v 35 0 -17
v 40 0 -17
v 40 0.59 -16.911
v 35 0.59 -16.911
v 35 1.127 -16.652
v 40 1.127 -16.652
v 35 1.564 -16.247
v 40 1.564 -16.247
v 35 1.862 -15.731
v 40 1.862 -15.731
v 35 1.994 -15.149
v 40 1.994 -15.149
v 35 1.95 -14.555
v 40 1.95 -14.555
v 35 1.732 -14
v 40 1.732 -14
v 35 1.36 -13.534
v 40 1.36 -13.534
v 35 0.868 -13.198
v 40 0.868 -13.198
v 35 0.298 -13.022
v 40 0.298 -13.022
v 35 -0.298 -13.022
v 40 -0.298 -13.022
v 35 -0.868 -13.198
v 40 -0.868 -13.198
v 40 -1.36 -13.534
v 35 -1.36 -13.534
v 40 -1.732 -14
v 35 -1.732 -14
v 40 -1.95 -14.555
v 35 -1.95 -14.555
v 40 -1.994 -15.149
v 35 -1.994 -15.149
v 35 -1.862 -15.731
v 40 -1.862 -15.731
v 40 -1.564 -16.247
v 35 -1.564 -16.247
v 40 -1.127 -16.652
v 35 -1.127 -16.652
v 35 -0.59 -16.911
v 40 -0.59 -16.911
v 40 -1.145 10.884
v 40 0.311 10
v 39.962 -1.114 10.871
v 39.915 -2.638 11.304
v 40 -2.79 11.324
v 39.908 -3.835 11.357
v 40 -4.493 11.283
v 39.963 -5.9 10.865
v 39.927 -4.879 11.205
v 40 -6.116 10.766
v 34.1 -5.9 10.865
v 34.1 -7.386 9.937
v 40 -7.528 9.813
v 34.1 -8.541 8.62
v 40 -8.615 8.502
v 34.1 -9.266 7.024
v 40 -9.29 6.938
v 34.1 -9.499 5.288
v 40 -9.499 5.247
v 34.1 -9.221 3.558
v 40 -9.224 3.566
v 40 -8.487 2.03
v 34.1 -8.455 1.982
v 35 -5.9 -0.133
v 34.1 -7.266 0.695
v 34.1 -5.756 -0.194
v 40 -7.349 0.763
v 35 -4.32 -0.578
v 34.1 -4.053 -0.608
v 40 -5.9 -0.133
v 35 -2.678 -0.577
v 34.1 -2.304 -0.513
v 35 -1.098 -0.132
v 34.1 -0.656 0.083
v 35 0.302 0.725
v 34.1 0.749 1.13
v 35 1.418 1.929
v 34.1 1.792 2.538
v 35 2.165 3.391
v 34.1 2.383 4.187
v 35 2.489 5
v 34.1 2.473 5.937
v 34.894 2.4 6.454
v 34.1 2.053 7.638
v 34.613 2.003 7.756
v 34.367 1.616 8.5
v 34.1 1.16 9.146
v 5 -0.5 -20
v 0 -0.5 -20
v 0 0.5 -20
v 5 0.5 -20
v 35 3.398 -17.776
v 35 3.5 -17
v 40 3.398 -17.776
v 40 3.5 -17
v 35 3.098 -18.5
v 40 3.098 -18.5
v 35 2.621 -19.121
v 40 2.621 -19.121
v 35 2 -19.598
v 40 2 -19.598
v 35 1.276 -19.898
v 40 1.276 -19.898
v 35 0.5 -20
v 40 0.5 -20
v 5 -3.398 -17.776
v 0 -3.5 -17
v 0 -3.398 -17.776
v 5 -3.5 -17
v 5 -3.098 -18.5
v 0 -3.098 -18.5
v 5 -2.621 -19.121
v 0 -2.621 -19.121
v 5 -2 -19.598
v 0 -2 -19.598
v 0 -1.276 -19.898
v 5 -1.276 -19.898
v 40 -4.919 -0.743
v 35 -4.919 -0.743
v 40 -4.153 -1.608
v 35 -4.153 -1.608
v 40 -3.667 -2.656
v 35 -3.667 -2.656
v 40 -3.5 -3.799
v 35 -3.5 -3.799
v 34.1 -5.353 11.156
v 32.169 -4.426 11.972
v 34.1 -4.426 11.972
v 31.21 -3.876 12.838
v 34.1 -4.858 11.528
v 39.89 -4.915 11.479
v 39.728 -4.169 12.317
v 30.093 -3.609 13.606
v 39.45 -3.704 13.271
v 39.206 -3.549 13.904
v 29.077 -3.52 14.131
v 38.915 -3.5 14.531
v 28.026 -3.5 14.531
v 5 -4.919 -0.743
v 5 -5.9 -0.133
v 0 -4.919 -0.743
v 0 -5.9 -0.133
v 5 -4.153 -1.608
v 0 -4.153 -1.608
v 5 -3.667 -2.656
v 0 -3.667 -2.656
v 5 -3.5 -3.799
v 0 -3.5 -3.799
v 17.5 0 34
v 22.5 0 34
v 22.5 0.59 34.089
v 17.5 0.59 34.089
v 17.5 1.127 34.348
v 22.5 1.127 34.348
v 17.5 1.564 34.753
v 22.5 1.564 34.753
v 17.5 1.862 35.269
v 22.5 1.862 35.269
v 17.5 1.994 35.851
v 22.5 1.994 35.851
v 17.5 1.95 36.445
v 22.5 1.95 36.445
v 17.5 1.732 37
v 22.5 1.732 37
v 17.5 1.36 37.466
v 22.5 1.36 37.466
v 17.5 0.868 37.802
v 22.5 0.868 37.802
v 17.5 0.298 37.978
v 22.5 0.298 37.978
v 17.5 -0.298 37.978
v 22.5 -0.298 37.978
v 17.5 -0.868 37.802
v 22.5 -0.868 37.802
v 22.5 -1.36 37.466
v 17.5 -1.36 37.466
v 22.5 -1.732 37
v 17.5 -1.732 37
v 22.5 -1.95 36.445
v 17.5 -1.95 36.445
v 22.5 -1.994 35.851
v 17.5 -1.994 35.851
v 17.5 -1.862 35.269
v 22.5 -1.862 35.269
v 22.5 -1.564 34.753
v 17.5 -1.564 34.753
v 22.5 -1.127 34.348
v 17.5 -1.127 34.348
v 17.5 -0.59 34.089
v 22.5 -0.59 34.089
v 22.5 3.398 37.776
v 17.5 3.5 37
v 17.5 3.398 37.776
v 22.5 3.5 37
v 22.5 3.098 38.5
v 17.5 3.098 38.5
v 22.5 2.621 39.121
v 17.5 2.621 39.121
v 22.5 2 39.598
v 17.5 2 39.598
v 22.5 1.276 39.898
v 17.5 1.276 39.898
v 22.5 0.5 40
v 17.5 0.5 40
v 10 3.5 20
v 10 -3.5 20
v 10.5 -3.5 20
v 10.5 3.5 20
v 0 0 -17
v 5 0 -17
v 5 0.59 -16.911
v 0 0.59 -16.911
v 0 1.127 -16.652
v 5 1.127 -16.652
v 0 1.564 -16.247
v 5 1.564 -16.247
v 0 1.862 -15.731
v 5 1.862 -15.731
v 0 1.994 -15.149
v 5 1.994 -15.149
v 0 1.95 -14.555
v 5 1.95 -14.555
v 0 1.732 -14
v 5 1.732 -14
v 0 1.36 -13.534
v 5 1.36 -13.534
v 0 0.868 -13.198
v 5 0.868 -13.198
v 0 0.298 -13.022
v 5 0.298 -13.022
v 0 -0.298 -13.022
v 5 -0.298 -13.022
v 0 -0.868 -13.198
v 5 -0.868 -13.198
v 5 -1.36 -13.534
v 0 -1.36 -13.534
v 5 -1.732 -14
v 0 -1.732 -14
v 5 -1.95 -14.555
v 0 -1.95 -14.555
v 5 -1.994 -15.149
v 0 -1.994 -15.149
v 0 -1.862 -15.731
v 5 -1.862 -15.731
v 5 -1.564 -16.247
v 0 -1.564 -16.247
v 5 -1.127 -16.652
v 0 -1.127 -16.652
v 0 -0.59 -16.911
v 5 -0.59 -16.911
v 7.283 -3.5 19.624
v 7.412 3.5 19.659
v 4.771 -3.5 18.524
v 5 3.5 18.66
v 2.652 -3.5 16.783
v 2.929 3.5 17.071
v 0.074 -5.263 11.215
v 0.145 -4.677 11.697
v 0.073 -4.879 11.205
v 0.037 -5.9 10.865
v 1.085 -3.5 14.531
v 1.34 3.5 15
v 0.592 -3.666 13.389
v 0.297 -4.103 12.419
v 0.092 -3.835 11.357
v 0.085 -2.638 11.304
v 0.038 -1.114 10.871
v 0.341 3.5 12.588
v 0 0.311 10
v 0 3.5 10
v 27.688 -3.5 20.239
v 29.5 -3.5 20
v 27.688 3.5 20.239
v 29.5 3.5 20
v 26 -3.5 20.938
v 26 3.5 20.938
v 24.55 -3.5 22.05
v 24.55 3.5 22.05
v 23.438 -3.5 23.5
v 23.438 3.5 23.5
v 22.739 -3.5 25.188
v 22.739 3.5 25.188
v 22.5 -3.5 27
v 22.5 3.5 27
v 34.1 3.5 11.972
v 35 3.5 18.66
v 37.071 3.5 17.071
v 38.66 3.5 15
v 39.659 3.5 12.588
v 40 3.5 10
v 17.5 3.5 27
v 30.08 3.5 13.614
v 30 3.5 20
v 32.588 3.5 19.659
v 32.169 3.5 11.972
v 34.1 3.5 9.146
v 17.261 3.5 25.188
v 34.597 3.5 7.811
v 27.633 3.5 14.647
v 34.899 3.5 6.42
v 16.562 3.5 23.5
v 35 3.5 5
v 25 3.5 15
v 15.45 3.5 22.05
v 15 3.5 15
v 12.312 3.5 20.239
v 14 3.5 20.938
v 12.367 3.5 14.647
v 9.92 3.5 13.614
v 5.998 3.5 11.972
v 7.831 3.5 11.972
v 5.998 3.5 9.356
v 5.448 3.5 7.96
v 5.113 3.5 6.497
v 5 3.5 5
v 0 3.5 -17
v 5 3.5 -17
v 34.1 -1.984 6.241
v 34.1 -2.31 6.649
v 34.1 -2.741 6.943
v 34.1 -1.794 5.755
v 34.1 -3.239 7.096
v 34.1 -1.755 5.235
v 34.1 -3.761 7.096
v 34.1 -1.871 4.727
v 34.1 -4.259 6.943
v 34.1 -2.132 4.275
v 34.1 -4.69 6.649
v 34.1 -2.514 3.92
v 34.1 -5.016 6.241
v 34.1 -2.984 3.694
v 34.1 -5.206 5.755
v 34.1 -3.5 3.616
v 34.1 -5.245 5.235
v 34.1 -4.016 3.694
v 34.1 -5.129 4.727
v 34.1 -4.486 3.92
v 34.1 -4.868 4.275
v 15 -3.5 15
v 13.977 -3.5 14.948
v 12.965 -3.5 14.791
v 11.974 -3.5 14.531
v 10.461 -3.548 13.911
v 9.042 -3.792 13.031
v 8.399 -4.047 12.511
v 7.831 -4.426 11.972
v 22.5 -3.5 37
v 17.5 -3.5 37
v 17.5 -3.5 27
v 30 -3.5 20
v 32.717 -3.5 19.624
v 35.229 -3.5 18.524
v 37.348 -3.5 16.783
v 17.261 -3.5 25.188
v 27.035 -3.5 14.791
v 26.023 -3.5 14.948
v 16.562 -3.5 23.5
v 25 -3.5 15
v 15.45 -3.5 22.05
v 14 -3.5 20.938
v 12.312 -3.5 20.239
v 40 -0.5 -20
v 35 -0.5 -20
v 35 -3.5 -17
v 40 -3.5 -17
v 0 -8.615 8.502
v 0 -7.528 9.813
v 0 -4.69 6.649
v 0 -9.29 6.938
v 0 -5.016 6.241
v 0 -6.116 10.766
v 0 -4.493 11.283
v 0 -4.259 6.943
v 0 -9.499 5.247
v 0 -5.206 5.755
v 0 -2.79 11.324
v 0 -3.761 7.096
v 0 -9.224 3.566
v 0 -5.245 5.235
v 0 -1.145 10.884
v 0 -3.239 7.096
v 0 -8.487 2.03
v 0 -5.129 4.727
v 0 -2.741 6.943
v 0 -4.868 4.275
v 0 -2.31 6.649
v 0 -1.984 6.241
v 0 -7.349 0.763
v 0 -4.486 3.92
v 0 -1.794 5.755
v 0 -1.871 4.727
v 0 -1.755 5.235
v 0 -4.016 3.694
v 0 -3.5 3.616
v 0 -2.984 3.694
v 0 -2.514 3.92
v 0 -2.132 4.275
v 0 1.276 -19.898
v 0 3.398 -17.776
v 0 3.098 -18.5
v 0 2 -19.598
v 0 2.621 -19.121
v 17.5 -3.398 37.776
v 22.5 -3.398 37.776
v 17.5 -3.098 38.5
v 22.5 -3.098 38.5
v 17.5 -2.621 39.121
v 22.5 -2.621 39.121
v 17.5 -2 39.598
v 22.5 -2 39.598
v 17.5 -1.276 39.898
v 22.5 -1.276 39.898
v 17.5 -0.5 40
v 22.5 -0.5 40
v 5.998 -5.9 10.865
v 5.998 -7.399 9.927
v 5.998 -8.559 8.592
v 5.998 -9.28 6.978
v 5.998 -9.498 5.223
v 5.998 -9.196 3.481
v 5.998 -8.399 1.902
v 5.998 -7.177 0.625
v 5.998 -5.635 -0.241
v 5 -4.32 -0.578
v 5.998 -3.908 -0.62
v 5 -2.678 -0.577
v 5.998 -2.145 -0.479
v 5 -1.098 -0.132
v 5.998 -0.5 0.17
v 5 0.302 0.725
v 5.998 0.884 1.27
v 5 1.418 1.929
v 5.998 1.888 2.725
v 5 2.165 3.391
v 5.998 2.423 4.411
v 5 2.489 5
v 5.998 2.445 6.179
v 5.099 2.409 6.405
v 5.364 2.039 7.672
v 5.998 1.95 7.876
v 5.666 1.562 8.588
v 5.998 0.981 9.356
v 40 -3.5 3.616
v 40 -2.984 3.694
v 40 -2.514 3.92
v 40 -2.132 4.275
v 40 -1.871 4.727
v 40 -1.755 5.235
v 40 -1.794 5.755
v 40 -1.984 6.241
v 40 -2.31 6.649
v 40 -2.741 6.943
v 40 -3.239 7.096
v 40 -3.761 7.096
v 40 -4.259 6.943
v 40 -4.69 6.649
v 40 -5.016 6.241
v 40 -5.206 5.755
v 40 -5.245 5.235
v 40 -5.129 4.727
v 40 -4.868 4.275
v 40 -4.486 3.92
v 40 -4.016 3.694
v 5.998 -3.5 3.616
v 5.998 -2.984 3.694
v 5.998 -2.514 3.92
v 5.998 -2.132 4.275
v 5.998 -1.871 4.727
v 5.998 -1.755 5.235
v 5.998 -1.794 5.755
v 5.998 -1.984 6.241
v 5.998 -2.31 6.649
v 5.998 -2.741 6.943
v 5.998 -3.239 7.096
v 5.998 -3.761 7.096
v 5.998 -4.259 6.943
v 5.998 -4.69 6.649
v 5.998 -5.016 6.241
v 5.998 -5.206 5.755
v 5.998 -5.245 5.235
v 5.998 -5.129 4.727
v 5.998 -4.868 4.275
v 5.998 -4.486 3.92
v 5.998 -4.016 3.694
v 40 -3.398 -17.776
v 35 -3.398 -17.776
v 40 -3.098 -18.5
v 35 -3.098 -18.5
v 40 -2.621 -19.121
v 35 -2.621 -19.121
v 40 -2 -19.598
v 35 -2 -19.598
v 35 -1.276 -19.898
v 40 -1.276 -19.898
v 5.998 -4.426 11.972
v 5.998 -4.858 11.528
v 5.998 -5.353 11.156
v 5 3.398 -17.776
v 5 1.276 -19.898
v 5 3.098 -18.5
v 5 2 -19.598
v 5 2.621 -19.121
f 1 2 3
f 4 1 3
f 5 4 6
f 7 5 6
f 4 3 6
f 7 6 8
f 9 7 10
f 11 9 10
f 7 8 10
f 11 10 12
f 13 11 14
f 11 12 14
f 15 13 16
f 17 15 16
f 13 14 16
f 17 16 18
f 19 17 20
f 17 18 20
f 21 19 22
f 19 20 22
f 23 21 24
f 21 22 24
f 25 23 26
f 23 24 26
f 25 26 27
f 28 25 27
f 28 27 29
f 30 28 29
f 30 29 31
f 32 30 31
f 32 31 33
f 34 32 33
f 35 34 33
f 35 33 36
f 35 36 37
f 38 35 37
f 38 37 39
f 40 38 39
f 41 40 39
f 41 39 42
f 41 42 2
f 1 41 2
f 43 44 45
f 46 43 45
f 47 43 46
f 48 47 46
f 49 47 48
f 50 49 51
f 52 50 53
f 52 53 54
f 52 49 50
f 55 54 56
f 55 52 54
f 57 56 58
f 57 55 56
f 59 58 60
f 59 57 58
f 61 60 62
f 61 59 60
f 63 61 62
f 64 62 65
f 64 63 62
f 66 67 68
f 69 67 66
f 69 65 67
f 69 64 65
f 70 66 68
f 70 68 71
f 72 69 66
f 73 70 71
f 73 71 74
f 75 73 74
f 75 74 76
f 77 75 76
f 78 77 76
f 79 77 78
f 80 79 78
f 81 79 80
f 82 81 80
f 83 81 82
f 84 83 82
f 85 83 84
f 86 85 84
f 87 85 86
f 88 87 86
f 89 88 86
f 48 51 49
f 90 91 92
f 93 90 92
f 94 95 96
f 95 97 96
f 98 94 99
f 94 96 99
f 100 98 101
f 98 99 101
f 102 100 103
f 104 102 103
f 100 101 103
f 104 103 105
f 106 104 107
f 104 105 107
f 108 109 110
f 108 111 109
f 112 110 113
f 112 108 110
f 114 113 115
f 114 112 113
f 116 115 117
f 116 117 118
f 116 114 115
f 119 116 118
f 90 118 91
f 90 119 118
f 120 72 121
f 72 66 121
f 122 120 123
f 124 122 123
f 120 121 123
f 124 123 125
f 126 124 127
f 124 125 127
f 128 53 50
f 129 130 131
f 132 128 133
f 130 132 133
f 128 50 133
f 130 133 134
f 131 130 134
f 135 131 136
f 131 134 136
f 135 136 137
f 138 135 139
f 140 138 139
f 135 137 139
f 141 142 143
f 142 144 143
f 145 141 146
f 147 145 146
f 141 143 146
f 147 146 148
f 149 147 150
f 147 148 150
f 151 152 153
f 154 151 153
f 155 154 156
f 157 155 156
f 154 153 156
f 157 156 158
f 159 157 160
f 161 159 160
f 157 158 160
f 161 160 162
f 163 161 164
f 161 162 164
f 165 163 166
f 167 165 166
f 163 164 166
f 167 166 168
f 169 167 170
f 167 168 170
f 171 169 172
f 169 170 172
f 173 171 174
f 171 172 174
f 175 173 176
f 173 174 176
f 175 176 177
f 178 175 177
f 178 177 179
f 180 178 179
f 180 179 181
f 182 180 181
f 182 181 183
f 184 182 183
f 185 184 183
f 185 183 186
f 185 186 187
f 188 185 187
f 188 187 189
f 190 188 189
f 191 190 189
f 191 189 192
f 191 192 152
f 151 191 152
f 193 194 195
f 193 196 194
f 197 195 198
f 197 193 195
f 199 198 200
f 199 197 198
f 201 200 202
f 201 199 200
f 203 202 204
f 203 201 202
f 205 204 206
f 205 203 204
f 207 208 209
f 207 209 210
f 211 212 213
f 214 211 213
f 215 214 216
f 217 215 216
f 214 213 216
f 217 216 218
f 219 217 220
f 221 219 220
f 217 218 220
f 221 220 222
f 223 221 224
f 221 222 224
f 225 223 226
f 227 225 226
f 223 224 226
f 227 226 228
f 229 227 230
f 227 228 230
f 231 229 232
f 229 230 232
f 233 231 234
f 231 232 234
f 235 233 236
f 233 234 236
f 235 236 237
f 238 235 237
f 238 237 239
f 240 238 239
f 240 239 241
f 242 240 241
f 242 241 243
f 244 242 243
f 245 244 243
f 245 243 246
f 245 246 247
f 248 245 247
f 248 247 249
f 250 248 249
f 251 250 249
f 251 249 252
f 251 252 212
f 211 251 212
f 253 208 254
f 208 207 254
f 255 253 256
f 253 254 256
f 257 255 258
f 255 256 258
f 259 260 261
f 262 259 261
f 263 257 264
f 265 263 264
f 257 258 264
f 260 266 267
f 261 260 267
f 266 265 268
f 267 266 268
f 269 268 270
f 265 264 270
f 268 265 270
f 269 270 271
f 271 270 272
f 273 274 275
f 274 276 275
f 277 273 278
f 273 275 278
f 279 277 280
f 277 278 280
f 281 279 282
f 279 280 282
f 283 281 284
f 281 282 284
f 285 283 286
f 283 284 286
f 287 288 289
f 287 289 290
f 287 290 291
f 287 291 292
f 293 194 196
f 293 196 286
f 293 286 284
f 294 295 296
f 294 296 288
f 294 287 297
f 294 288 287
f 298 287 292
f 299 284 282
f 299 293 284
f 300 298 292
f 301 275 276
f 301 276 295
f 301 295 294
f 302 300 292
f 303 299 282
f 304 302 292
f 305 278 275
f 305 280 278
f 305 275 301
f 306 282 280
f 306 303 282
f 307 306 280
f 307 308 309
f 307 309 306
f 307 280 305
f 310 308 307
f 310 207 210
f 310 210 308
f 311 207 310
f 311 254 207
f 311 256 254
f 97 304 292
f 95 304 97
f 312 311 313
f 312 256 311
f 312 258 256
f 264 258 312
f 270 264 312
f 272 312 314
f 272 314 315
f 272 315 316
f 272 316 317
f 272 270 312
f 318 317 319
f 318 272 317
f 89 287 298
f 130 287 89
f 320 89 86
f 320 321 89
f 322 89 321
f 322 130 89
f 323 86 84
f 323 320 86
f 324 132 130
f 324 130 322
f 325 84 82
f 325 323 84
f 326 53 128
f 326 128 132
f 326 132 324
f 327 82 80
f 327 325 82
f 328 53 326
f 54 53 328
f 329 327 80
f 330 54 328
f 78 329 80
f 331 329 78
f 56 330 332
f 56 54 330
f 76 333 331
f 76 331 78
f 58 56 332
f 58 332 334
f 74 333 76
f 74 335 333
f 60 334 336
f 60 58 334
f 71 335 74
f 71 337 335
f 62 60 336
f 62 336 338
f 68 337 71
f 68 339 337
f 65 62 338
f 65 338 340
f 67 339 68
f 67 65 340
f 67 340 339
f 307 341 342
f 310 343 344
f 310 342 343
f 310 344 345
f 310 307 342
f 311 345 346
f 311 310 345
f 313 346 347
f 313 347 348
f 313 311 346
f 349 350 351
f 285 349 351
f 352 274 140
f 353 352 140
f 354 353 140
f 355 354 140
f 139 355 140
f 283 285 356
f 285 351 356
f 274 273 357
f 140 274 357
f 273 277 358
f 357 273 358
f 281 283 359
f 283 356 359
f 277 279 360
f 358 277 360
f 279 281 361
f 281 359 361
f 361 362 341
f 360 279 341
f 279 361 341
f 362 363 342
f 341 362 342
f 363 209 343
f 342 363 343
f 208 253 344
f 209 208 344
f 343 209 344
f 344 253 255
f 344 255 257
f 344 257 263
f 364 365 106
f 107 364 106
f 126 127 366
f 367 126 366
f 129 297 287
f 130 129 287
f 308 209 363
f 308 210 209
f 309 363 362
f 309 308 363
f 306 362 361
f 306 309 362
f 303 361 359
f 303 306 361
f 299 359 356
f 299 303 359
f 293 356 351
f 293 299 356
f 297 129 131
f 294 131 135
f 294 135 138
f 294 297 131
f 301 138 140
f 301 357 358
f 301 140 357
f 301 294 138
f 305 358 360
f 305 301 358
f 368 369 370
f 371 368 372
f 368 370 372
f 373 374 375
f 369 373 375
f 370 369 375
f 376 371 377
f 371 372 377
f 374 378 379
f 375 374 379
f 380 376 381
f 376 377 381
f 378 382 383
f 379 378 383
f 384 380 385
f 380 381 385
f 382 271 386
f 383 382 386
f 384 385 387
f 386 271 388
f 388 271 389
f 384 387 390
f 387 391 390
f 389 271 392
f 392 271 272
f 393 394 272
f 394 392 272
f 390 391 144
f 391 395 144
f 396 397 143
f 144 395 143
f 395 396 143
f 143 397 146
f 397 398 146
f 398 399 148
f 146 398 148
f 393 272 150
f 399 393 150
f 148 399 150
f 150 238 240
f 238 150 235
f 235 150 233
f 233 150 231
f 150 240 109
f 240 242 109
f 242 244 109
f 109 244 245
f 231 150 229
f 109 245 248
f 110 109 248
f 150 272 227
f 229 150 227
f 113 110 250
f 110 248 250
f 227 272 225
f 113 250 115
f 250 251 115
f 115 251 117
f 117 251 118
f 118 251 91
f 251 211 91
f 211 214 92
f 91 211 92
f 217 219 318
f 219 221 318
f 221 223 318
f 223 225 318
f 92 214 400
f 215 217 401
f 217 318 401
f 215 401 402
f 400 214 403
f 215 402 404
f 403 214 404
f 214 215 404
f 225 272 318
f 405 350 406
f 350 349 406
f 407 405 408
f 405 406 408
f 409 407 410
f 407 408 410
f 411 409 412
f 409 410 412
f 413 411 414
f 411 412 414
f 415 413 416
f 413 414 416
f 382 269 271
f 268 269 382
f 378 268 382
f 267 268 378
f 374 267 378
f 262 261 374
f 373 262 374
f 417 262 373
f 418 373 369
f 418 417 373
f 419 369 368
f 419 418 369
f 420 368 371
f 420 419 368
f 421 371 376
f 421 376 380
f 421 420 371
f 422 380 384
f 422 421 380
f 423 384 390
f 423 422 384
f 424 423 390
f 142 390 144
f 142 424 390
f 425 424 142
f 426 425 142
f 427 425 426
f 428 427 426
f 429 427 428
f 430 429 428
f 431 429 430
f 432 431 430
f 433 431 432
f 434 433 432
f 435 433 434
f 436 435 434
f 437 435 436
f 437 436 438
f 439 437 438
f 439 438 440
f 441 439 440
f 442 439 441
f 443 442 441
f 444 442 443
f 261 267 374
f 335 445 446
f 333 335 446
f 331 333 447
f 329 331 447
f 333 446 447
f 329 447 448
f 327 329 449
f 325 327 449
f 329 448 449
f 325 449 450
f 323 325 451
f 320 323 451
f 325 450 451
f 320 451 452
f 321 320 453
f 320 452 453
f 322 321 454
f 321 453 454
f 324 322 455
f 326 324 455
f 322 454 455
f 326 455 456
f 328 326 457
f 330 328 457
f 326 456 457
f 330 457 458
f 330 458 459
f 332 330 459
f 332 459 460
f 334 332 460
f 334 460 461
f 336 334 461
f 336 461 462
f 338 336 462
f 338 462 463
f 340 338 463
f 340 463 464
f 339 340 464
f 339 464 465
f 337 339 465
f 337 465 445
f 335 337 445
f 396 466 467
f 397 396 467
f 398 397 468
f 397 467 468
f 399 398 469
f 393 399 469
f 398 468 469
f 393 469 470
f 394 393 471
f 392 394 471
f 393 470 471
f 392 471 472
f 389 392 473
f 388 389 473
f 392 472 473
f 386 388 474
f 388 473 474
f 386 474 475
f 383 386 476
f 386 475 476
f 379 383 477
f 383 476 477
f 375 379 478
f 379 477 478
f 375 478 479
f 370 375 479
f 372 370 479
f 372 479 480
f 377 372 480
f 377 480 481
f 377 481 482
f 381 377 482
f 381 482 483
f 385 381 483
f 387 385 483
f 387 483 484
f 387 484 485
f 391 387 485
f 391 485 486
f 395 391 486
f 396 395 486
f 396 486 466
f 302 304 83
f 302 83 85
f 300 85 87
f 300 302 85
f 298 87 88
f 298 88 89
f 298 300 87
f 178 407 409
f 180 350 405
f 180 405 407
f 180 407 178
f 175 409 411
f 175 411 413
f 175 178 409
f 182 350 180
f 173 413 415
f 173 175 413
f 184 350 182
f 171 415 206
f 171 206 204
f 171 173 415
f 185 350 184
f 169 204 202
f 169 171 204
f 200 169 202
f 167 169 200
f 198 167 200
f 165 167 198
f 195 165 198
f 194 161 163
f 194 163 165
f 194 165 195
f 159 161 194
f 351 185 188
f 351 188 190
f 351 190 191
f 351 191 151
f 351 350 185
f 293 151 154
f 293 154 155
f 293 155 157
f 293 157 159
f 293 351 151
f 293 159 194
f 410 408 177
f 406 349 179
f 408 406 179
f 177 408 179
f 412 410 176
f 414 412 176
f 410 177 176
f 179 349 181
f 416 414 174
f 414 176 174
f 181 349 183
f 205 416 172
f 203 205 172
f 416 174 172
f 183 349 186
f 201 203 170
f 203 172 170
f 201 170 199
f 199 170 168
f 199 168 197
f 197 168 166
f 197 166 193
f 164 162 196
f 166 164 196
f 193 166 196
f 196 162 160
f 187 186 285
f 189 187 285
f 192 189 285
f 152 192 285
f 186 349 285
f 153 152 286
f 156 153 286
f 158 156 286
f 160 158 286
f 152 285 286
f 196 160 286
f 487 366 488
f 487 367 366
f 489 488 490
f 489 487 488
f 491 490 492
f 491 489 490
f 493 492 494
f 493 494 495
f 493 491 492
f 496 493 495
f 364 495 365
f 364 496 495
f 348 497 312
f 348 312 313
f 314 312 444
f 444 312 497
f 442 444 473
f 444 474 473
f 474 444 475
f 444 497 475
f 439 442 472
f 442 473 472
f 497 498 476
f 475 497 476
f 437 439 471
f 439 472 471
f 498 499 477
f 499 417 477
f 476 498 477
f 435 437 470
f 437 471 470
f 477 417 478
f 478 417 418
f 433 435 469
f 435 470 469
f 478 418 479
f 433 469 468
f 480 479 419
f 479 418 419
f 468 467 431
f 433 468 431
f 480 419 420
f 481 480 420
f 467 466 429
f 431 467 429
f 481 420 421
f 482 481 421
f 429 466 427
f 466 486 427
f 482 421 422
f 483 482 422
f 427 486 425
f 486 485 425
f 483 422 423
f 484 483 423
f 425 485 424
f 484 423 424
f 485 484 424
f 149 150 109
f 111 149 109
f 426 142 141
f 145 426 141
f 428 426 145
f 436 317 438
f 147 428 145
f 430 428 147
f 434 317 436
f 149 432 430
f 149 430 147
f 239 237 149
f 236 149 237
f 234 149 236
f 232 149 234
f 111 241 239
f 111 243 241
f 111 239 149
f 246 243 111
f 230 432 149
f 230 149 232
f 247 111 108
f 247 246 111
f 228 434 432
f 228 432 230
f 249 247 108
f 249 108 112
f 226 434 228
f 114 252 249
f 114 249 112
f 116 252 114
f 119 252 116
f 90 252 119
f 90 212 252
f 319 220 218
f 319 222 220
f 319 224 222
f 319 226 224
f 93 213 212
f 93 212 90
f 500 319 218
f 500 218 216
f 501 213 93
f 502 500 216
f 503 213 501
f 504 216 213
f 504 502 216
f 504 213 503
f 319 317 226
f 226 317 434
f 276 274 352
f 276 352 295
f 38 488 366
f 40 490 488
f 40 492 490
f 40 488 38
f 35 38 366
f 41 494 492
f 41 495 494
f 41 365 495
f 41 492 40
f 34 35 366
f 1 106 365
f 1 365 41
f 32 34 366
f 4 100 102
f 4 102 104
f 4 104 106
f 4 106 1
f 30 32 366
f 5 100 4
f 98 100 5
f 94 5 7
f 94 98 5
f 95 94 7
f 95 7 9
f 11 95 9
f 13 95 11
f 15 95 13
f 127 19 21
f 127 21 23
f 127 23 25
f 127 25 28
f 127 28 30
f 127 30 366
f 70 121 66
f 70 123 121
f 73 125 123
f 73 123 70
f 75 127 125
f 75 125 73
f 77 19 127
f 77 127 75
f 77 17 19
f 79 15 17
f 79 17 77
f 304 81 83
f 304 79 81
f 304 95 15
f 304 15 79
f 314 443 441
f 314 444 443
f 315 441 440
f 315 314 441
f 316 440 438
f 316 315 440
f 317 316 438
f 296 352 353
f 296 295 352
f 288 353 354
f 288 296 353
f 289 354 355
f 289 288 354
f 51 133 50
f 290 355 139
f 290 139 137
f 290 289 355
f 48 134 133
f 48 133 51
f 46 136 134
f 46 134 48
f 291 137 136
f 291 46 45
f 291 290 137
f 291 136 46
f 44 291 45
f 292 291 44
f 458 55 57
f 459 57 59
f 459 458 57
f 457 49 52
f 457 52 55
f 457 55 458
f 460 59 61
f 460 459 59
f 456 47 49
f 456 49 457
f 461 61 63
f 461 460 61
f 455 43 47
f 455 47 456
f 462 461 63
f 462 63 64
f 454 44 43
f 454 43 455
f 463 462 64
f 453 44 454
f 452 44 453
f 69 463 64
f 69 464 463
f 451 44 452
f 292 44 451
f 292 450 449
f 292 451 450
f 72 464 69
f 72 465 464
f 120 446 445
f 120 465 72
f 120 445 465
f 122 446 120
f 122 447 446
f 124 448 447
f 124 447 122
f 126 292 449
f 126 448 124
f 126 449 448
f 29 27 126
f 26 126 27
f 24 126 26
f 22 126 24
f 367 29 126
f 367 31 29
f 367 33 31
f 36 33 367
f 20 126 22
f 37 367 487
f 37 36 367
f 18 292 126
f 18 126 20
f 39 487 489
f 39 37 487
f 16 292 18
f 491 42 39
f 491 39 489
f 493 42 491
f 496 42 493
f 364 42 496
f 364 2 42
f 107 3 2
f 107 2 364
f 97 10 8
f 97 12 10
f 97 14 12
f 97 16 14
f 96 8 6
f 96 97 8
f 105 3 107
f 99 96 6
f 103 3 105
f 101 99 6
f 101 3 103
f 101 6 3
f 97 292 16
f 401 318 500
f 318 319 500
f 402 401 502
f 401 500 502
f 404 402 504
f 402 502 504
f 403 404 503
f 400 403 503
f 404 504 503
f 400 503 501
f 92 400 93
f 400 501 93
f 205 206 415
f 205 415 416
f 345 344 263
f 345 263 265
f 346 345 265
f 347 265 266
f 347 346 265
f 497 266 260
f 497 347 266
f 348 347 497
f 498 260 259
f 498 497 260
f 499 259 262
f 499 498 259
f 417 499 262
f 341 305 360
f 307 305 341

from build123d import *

# Parameters (mm, degrees)
SKETCH1_W               = 40
SKETCH1_H               = 7
BOSS_EXTRUDE1_DEPTH     = 40
CUT_EXTRUDE1_DEPTH      = 8
FILLET1_R               = 10
SKETCH5_W               = 5
SKETCH5_H               = 7
BOSS_EXTRUDE2_DEPTH     = 20
FILLET2_R               = 7
FILLET3_R               = 3
SKETCH6_R               = 2
CUT_EXTRUDE2_DEPTH      = 41
SKETCH7_R               = 2
CUT_EXTRUDE3_DEPTH      = 23.5
SKETCH8_R               = 6
BOSS_EXTRUDE3_DEPTH     = 40
SKETCH9_W               = 28.10166571
SKETCH9_H               = 14.198736358
CUT_EXTRUDE4_DEPTH      = 4.5000001
CUT_EXTRUDE4_DEPTH_BACK = 10.5000001
SKETCH10_R              = 1.75
CUT_EXTRUDE5_DEPTH      = 41.0000001
FILLET4_R               = 4


with BuildPart() as part:
    # Sketch1 → Boss-Extrude1 (new body)
    with BuildSketch(Plane(origin=(0, 0, 0), x_dir=(0, 0, -1), z_dir=(1, 0, 0))):
        Rectangle(SKETCH1_W, SKETCH1_H)
    extrude(amount=BOSS_EXTRUDE1_DEPTH)

    # Sketch2 → Cut-Extrude1 (cut, through all)
    with BuildSketch(Plane(origin=(0, 3.5, 0), x_dir=(1, 0, 0), z_dir=(0, 1, 0))):
        with BuildLine():
            Line((5, 20), (35, 20))
            Line((35, 20), (35, -5))
            ThreePointArc((35, -5), (32.071067812, -12.071067812), (25, -15))
            Line((25, -15), (15, -15))
            ThreePointArc((15, -15), (7.928932188, -12.071067812), (5, -5))
            Line((5, -5), (5, 20))
        make_face()
    extrude(amount=-CUT_EXTRUDE1_DEPTH, mode=Mode.SUBTRACT)

    # Fillet1
    fillet1_edges = [part.edges().sort_by_distance(p)[0] for p in [
        (40, 0, 20),
        (0, 0, 20),
    ]]
    fillet(fillet1_edges, radius=FILLET1_R)

    # Sketch5 → Boss-Extrude2 (add)
    with BuildSketch(Plane.XY.offset(20)):
        with Locations((20, 0)):
            Rectangle(SKETCH5_W, SKETCH5_H)
    extrude(amount=BOSS_EXTRUDE2_DEPTH)

    # Fillet2
    fillet2_edges = [part.edges().sort_by_distance(p)[0] for p in [
        (17.5, 0, 20),
        (22.5, 0, 20),
    ]]
    fillet(fillet2_edges, radius=FILLET2_R)

    # Fillet3
    fillet3_edges = [part.edges().sort_by_distance(p)[0] for p in [
        (2.5, -3.5, -20),
        (2.5, 3.5, -20),
        (20, -3.5, 40),
        (20, 3.5, 40),
        (37.5, -3.5, -20),
        (37.5, 3.5, -20),
    ]]
    fillet(fillet3_edges, radius=FILLET3_R)

    # Sketch6 → Cut-Extrude2 (cut, through all)
    with BuildSketch(Plane(origin=(40, 0, 0), x_dir=(0, 0, -1), z_dir=(1, 0, 0))):
        with Locations((15, 0)):
            Circle(SKETCH6_R)
    extrude(amount=-CUT_EXTRUDE2_DEPTH, mode=Mode.SUBTRACT)

    # Sketch7 → Cut-Extrude3 (cut, through all)
    with BuildSketch(Plane(origin=(22.5, 0, 0), x_dir=(0, 0, -1), z_dir=(1, 0, 0))):
        with Locations((-36, 0)):
            Circle(SKETCH7_R)
    extrude(amount=-CUT_EXTRUDE3_DEPTH, mode=Mode.SUBTRACT)

    # Sketch8 → Boss-Extrude3 (add)
    with BuildSketch(Plane(origin=(40, 0, 0), x_dir=(0, 0, -1), z_dir=(1, 0, 0))):
        with Locations((-5.366027913, -3.5)):
            Circle(SKETCH8_R)
    extrude(amount=-BOSS_EXTRUDE3_DEPTH)

    # Sketch9 → Cut-Extrude4 (cut, two sides)
    with BuildSketch(Plane(origin=(0, 0, 0), x_dir=(1, 0, 0), z_dir=(0, 1, 0))) as cut_extrude4_sk:
        with Locations((20.049301168, -4.872678537)):
            Rectangle(SKETCH9_W, SKETCH9_H)
    extrude(amount=CUT_EXTRUDE4_DEPTH, mode=Mode.SUBTRACT)
    extrude(cut_extrude4_sk.sketch, amount=-CUT_EXTRUDE4_DEPTH_BACK, mode=Mode.SUBTRACT)

    # Sketch10 → Cut-Extrude5 (cut, through all)
    with BuildSketch(Plane(origin=(40, 0, 0), x_dir=(0, 0, -1), z_dir=(1, 0, 0))):
        with Locations((-5.366027913, -3.5)):
            Circle(SKETCH10_R)
    extrude(amount=-CUT_EXTRUDE5_DEPTH, mode=Mode.SUBTRACT)

    # Fillet4
    fillet4_edges = [part.edges().sort_by_distance(p)[0] for p in [
        (37.5, -3.5, -0.633972087),
        (2.5, -3.5, -0.633972087),
        (3.046104647, -3.5, 11.366027913),
        (37.00319652, -3.5, 11.366027913),
    ]]
    fillet(fillet4_edges, radius=FILLET4_R)


solid = part.part
